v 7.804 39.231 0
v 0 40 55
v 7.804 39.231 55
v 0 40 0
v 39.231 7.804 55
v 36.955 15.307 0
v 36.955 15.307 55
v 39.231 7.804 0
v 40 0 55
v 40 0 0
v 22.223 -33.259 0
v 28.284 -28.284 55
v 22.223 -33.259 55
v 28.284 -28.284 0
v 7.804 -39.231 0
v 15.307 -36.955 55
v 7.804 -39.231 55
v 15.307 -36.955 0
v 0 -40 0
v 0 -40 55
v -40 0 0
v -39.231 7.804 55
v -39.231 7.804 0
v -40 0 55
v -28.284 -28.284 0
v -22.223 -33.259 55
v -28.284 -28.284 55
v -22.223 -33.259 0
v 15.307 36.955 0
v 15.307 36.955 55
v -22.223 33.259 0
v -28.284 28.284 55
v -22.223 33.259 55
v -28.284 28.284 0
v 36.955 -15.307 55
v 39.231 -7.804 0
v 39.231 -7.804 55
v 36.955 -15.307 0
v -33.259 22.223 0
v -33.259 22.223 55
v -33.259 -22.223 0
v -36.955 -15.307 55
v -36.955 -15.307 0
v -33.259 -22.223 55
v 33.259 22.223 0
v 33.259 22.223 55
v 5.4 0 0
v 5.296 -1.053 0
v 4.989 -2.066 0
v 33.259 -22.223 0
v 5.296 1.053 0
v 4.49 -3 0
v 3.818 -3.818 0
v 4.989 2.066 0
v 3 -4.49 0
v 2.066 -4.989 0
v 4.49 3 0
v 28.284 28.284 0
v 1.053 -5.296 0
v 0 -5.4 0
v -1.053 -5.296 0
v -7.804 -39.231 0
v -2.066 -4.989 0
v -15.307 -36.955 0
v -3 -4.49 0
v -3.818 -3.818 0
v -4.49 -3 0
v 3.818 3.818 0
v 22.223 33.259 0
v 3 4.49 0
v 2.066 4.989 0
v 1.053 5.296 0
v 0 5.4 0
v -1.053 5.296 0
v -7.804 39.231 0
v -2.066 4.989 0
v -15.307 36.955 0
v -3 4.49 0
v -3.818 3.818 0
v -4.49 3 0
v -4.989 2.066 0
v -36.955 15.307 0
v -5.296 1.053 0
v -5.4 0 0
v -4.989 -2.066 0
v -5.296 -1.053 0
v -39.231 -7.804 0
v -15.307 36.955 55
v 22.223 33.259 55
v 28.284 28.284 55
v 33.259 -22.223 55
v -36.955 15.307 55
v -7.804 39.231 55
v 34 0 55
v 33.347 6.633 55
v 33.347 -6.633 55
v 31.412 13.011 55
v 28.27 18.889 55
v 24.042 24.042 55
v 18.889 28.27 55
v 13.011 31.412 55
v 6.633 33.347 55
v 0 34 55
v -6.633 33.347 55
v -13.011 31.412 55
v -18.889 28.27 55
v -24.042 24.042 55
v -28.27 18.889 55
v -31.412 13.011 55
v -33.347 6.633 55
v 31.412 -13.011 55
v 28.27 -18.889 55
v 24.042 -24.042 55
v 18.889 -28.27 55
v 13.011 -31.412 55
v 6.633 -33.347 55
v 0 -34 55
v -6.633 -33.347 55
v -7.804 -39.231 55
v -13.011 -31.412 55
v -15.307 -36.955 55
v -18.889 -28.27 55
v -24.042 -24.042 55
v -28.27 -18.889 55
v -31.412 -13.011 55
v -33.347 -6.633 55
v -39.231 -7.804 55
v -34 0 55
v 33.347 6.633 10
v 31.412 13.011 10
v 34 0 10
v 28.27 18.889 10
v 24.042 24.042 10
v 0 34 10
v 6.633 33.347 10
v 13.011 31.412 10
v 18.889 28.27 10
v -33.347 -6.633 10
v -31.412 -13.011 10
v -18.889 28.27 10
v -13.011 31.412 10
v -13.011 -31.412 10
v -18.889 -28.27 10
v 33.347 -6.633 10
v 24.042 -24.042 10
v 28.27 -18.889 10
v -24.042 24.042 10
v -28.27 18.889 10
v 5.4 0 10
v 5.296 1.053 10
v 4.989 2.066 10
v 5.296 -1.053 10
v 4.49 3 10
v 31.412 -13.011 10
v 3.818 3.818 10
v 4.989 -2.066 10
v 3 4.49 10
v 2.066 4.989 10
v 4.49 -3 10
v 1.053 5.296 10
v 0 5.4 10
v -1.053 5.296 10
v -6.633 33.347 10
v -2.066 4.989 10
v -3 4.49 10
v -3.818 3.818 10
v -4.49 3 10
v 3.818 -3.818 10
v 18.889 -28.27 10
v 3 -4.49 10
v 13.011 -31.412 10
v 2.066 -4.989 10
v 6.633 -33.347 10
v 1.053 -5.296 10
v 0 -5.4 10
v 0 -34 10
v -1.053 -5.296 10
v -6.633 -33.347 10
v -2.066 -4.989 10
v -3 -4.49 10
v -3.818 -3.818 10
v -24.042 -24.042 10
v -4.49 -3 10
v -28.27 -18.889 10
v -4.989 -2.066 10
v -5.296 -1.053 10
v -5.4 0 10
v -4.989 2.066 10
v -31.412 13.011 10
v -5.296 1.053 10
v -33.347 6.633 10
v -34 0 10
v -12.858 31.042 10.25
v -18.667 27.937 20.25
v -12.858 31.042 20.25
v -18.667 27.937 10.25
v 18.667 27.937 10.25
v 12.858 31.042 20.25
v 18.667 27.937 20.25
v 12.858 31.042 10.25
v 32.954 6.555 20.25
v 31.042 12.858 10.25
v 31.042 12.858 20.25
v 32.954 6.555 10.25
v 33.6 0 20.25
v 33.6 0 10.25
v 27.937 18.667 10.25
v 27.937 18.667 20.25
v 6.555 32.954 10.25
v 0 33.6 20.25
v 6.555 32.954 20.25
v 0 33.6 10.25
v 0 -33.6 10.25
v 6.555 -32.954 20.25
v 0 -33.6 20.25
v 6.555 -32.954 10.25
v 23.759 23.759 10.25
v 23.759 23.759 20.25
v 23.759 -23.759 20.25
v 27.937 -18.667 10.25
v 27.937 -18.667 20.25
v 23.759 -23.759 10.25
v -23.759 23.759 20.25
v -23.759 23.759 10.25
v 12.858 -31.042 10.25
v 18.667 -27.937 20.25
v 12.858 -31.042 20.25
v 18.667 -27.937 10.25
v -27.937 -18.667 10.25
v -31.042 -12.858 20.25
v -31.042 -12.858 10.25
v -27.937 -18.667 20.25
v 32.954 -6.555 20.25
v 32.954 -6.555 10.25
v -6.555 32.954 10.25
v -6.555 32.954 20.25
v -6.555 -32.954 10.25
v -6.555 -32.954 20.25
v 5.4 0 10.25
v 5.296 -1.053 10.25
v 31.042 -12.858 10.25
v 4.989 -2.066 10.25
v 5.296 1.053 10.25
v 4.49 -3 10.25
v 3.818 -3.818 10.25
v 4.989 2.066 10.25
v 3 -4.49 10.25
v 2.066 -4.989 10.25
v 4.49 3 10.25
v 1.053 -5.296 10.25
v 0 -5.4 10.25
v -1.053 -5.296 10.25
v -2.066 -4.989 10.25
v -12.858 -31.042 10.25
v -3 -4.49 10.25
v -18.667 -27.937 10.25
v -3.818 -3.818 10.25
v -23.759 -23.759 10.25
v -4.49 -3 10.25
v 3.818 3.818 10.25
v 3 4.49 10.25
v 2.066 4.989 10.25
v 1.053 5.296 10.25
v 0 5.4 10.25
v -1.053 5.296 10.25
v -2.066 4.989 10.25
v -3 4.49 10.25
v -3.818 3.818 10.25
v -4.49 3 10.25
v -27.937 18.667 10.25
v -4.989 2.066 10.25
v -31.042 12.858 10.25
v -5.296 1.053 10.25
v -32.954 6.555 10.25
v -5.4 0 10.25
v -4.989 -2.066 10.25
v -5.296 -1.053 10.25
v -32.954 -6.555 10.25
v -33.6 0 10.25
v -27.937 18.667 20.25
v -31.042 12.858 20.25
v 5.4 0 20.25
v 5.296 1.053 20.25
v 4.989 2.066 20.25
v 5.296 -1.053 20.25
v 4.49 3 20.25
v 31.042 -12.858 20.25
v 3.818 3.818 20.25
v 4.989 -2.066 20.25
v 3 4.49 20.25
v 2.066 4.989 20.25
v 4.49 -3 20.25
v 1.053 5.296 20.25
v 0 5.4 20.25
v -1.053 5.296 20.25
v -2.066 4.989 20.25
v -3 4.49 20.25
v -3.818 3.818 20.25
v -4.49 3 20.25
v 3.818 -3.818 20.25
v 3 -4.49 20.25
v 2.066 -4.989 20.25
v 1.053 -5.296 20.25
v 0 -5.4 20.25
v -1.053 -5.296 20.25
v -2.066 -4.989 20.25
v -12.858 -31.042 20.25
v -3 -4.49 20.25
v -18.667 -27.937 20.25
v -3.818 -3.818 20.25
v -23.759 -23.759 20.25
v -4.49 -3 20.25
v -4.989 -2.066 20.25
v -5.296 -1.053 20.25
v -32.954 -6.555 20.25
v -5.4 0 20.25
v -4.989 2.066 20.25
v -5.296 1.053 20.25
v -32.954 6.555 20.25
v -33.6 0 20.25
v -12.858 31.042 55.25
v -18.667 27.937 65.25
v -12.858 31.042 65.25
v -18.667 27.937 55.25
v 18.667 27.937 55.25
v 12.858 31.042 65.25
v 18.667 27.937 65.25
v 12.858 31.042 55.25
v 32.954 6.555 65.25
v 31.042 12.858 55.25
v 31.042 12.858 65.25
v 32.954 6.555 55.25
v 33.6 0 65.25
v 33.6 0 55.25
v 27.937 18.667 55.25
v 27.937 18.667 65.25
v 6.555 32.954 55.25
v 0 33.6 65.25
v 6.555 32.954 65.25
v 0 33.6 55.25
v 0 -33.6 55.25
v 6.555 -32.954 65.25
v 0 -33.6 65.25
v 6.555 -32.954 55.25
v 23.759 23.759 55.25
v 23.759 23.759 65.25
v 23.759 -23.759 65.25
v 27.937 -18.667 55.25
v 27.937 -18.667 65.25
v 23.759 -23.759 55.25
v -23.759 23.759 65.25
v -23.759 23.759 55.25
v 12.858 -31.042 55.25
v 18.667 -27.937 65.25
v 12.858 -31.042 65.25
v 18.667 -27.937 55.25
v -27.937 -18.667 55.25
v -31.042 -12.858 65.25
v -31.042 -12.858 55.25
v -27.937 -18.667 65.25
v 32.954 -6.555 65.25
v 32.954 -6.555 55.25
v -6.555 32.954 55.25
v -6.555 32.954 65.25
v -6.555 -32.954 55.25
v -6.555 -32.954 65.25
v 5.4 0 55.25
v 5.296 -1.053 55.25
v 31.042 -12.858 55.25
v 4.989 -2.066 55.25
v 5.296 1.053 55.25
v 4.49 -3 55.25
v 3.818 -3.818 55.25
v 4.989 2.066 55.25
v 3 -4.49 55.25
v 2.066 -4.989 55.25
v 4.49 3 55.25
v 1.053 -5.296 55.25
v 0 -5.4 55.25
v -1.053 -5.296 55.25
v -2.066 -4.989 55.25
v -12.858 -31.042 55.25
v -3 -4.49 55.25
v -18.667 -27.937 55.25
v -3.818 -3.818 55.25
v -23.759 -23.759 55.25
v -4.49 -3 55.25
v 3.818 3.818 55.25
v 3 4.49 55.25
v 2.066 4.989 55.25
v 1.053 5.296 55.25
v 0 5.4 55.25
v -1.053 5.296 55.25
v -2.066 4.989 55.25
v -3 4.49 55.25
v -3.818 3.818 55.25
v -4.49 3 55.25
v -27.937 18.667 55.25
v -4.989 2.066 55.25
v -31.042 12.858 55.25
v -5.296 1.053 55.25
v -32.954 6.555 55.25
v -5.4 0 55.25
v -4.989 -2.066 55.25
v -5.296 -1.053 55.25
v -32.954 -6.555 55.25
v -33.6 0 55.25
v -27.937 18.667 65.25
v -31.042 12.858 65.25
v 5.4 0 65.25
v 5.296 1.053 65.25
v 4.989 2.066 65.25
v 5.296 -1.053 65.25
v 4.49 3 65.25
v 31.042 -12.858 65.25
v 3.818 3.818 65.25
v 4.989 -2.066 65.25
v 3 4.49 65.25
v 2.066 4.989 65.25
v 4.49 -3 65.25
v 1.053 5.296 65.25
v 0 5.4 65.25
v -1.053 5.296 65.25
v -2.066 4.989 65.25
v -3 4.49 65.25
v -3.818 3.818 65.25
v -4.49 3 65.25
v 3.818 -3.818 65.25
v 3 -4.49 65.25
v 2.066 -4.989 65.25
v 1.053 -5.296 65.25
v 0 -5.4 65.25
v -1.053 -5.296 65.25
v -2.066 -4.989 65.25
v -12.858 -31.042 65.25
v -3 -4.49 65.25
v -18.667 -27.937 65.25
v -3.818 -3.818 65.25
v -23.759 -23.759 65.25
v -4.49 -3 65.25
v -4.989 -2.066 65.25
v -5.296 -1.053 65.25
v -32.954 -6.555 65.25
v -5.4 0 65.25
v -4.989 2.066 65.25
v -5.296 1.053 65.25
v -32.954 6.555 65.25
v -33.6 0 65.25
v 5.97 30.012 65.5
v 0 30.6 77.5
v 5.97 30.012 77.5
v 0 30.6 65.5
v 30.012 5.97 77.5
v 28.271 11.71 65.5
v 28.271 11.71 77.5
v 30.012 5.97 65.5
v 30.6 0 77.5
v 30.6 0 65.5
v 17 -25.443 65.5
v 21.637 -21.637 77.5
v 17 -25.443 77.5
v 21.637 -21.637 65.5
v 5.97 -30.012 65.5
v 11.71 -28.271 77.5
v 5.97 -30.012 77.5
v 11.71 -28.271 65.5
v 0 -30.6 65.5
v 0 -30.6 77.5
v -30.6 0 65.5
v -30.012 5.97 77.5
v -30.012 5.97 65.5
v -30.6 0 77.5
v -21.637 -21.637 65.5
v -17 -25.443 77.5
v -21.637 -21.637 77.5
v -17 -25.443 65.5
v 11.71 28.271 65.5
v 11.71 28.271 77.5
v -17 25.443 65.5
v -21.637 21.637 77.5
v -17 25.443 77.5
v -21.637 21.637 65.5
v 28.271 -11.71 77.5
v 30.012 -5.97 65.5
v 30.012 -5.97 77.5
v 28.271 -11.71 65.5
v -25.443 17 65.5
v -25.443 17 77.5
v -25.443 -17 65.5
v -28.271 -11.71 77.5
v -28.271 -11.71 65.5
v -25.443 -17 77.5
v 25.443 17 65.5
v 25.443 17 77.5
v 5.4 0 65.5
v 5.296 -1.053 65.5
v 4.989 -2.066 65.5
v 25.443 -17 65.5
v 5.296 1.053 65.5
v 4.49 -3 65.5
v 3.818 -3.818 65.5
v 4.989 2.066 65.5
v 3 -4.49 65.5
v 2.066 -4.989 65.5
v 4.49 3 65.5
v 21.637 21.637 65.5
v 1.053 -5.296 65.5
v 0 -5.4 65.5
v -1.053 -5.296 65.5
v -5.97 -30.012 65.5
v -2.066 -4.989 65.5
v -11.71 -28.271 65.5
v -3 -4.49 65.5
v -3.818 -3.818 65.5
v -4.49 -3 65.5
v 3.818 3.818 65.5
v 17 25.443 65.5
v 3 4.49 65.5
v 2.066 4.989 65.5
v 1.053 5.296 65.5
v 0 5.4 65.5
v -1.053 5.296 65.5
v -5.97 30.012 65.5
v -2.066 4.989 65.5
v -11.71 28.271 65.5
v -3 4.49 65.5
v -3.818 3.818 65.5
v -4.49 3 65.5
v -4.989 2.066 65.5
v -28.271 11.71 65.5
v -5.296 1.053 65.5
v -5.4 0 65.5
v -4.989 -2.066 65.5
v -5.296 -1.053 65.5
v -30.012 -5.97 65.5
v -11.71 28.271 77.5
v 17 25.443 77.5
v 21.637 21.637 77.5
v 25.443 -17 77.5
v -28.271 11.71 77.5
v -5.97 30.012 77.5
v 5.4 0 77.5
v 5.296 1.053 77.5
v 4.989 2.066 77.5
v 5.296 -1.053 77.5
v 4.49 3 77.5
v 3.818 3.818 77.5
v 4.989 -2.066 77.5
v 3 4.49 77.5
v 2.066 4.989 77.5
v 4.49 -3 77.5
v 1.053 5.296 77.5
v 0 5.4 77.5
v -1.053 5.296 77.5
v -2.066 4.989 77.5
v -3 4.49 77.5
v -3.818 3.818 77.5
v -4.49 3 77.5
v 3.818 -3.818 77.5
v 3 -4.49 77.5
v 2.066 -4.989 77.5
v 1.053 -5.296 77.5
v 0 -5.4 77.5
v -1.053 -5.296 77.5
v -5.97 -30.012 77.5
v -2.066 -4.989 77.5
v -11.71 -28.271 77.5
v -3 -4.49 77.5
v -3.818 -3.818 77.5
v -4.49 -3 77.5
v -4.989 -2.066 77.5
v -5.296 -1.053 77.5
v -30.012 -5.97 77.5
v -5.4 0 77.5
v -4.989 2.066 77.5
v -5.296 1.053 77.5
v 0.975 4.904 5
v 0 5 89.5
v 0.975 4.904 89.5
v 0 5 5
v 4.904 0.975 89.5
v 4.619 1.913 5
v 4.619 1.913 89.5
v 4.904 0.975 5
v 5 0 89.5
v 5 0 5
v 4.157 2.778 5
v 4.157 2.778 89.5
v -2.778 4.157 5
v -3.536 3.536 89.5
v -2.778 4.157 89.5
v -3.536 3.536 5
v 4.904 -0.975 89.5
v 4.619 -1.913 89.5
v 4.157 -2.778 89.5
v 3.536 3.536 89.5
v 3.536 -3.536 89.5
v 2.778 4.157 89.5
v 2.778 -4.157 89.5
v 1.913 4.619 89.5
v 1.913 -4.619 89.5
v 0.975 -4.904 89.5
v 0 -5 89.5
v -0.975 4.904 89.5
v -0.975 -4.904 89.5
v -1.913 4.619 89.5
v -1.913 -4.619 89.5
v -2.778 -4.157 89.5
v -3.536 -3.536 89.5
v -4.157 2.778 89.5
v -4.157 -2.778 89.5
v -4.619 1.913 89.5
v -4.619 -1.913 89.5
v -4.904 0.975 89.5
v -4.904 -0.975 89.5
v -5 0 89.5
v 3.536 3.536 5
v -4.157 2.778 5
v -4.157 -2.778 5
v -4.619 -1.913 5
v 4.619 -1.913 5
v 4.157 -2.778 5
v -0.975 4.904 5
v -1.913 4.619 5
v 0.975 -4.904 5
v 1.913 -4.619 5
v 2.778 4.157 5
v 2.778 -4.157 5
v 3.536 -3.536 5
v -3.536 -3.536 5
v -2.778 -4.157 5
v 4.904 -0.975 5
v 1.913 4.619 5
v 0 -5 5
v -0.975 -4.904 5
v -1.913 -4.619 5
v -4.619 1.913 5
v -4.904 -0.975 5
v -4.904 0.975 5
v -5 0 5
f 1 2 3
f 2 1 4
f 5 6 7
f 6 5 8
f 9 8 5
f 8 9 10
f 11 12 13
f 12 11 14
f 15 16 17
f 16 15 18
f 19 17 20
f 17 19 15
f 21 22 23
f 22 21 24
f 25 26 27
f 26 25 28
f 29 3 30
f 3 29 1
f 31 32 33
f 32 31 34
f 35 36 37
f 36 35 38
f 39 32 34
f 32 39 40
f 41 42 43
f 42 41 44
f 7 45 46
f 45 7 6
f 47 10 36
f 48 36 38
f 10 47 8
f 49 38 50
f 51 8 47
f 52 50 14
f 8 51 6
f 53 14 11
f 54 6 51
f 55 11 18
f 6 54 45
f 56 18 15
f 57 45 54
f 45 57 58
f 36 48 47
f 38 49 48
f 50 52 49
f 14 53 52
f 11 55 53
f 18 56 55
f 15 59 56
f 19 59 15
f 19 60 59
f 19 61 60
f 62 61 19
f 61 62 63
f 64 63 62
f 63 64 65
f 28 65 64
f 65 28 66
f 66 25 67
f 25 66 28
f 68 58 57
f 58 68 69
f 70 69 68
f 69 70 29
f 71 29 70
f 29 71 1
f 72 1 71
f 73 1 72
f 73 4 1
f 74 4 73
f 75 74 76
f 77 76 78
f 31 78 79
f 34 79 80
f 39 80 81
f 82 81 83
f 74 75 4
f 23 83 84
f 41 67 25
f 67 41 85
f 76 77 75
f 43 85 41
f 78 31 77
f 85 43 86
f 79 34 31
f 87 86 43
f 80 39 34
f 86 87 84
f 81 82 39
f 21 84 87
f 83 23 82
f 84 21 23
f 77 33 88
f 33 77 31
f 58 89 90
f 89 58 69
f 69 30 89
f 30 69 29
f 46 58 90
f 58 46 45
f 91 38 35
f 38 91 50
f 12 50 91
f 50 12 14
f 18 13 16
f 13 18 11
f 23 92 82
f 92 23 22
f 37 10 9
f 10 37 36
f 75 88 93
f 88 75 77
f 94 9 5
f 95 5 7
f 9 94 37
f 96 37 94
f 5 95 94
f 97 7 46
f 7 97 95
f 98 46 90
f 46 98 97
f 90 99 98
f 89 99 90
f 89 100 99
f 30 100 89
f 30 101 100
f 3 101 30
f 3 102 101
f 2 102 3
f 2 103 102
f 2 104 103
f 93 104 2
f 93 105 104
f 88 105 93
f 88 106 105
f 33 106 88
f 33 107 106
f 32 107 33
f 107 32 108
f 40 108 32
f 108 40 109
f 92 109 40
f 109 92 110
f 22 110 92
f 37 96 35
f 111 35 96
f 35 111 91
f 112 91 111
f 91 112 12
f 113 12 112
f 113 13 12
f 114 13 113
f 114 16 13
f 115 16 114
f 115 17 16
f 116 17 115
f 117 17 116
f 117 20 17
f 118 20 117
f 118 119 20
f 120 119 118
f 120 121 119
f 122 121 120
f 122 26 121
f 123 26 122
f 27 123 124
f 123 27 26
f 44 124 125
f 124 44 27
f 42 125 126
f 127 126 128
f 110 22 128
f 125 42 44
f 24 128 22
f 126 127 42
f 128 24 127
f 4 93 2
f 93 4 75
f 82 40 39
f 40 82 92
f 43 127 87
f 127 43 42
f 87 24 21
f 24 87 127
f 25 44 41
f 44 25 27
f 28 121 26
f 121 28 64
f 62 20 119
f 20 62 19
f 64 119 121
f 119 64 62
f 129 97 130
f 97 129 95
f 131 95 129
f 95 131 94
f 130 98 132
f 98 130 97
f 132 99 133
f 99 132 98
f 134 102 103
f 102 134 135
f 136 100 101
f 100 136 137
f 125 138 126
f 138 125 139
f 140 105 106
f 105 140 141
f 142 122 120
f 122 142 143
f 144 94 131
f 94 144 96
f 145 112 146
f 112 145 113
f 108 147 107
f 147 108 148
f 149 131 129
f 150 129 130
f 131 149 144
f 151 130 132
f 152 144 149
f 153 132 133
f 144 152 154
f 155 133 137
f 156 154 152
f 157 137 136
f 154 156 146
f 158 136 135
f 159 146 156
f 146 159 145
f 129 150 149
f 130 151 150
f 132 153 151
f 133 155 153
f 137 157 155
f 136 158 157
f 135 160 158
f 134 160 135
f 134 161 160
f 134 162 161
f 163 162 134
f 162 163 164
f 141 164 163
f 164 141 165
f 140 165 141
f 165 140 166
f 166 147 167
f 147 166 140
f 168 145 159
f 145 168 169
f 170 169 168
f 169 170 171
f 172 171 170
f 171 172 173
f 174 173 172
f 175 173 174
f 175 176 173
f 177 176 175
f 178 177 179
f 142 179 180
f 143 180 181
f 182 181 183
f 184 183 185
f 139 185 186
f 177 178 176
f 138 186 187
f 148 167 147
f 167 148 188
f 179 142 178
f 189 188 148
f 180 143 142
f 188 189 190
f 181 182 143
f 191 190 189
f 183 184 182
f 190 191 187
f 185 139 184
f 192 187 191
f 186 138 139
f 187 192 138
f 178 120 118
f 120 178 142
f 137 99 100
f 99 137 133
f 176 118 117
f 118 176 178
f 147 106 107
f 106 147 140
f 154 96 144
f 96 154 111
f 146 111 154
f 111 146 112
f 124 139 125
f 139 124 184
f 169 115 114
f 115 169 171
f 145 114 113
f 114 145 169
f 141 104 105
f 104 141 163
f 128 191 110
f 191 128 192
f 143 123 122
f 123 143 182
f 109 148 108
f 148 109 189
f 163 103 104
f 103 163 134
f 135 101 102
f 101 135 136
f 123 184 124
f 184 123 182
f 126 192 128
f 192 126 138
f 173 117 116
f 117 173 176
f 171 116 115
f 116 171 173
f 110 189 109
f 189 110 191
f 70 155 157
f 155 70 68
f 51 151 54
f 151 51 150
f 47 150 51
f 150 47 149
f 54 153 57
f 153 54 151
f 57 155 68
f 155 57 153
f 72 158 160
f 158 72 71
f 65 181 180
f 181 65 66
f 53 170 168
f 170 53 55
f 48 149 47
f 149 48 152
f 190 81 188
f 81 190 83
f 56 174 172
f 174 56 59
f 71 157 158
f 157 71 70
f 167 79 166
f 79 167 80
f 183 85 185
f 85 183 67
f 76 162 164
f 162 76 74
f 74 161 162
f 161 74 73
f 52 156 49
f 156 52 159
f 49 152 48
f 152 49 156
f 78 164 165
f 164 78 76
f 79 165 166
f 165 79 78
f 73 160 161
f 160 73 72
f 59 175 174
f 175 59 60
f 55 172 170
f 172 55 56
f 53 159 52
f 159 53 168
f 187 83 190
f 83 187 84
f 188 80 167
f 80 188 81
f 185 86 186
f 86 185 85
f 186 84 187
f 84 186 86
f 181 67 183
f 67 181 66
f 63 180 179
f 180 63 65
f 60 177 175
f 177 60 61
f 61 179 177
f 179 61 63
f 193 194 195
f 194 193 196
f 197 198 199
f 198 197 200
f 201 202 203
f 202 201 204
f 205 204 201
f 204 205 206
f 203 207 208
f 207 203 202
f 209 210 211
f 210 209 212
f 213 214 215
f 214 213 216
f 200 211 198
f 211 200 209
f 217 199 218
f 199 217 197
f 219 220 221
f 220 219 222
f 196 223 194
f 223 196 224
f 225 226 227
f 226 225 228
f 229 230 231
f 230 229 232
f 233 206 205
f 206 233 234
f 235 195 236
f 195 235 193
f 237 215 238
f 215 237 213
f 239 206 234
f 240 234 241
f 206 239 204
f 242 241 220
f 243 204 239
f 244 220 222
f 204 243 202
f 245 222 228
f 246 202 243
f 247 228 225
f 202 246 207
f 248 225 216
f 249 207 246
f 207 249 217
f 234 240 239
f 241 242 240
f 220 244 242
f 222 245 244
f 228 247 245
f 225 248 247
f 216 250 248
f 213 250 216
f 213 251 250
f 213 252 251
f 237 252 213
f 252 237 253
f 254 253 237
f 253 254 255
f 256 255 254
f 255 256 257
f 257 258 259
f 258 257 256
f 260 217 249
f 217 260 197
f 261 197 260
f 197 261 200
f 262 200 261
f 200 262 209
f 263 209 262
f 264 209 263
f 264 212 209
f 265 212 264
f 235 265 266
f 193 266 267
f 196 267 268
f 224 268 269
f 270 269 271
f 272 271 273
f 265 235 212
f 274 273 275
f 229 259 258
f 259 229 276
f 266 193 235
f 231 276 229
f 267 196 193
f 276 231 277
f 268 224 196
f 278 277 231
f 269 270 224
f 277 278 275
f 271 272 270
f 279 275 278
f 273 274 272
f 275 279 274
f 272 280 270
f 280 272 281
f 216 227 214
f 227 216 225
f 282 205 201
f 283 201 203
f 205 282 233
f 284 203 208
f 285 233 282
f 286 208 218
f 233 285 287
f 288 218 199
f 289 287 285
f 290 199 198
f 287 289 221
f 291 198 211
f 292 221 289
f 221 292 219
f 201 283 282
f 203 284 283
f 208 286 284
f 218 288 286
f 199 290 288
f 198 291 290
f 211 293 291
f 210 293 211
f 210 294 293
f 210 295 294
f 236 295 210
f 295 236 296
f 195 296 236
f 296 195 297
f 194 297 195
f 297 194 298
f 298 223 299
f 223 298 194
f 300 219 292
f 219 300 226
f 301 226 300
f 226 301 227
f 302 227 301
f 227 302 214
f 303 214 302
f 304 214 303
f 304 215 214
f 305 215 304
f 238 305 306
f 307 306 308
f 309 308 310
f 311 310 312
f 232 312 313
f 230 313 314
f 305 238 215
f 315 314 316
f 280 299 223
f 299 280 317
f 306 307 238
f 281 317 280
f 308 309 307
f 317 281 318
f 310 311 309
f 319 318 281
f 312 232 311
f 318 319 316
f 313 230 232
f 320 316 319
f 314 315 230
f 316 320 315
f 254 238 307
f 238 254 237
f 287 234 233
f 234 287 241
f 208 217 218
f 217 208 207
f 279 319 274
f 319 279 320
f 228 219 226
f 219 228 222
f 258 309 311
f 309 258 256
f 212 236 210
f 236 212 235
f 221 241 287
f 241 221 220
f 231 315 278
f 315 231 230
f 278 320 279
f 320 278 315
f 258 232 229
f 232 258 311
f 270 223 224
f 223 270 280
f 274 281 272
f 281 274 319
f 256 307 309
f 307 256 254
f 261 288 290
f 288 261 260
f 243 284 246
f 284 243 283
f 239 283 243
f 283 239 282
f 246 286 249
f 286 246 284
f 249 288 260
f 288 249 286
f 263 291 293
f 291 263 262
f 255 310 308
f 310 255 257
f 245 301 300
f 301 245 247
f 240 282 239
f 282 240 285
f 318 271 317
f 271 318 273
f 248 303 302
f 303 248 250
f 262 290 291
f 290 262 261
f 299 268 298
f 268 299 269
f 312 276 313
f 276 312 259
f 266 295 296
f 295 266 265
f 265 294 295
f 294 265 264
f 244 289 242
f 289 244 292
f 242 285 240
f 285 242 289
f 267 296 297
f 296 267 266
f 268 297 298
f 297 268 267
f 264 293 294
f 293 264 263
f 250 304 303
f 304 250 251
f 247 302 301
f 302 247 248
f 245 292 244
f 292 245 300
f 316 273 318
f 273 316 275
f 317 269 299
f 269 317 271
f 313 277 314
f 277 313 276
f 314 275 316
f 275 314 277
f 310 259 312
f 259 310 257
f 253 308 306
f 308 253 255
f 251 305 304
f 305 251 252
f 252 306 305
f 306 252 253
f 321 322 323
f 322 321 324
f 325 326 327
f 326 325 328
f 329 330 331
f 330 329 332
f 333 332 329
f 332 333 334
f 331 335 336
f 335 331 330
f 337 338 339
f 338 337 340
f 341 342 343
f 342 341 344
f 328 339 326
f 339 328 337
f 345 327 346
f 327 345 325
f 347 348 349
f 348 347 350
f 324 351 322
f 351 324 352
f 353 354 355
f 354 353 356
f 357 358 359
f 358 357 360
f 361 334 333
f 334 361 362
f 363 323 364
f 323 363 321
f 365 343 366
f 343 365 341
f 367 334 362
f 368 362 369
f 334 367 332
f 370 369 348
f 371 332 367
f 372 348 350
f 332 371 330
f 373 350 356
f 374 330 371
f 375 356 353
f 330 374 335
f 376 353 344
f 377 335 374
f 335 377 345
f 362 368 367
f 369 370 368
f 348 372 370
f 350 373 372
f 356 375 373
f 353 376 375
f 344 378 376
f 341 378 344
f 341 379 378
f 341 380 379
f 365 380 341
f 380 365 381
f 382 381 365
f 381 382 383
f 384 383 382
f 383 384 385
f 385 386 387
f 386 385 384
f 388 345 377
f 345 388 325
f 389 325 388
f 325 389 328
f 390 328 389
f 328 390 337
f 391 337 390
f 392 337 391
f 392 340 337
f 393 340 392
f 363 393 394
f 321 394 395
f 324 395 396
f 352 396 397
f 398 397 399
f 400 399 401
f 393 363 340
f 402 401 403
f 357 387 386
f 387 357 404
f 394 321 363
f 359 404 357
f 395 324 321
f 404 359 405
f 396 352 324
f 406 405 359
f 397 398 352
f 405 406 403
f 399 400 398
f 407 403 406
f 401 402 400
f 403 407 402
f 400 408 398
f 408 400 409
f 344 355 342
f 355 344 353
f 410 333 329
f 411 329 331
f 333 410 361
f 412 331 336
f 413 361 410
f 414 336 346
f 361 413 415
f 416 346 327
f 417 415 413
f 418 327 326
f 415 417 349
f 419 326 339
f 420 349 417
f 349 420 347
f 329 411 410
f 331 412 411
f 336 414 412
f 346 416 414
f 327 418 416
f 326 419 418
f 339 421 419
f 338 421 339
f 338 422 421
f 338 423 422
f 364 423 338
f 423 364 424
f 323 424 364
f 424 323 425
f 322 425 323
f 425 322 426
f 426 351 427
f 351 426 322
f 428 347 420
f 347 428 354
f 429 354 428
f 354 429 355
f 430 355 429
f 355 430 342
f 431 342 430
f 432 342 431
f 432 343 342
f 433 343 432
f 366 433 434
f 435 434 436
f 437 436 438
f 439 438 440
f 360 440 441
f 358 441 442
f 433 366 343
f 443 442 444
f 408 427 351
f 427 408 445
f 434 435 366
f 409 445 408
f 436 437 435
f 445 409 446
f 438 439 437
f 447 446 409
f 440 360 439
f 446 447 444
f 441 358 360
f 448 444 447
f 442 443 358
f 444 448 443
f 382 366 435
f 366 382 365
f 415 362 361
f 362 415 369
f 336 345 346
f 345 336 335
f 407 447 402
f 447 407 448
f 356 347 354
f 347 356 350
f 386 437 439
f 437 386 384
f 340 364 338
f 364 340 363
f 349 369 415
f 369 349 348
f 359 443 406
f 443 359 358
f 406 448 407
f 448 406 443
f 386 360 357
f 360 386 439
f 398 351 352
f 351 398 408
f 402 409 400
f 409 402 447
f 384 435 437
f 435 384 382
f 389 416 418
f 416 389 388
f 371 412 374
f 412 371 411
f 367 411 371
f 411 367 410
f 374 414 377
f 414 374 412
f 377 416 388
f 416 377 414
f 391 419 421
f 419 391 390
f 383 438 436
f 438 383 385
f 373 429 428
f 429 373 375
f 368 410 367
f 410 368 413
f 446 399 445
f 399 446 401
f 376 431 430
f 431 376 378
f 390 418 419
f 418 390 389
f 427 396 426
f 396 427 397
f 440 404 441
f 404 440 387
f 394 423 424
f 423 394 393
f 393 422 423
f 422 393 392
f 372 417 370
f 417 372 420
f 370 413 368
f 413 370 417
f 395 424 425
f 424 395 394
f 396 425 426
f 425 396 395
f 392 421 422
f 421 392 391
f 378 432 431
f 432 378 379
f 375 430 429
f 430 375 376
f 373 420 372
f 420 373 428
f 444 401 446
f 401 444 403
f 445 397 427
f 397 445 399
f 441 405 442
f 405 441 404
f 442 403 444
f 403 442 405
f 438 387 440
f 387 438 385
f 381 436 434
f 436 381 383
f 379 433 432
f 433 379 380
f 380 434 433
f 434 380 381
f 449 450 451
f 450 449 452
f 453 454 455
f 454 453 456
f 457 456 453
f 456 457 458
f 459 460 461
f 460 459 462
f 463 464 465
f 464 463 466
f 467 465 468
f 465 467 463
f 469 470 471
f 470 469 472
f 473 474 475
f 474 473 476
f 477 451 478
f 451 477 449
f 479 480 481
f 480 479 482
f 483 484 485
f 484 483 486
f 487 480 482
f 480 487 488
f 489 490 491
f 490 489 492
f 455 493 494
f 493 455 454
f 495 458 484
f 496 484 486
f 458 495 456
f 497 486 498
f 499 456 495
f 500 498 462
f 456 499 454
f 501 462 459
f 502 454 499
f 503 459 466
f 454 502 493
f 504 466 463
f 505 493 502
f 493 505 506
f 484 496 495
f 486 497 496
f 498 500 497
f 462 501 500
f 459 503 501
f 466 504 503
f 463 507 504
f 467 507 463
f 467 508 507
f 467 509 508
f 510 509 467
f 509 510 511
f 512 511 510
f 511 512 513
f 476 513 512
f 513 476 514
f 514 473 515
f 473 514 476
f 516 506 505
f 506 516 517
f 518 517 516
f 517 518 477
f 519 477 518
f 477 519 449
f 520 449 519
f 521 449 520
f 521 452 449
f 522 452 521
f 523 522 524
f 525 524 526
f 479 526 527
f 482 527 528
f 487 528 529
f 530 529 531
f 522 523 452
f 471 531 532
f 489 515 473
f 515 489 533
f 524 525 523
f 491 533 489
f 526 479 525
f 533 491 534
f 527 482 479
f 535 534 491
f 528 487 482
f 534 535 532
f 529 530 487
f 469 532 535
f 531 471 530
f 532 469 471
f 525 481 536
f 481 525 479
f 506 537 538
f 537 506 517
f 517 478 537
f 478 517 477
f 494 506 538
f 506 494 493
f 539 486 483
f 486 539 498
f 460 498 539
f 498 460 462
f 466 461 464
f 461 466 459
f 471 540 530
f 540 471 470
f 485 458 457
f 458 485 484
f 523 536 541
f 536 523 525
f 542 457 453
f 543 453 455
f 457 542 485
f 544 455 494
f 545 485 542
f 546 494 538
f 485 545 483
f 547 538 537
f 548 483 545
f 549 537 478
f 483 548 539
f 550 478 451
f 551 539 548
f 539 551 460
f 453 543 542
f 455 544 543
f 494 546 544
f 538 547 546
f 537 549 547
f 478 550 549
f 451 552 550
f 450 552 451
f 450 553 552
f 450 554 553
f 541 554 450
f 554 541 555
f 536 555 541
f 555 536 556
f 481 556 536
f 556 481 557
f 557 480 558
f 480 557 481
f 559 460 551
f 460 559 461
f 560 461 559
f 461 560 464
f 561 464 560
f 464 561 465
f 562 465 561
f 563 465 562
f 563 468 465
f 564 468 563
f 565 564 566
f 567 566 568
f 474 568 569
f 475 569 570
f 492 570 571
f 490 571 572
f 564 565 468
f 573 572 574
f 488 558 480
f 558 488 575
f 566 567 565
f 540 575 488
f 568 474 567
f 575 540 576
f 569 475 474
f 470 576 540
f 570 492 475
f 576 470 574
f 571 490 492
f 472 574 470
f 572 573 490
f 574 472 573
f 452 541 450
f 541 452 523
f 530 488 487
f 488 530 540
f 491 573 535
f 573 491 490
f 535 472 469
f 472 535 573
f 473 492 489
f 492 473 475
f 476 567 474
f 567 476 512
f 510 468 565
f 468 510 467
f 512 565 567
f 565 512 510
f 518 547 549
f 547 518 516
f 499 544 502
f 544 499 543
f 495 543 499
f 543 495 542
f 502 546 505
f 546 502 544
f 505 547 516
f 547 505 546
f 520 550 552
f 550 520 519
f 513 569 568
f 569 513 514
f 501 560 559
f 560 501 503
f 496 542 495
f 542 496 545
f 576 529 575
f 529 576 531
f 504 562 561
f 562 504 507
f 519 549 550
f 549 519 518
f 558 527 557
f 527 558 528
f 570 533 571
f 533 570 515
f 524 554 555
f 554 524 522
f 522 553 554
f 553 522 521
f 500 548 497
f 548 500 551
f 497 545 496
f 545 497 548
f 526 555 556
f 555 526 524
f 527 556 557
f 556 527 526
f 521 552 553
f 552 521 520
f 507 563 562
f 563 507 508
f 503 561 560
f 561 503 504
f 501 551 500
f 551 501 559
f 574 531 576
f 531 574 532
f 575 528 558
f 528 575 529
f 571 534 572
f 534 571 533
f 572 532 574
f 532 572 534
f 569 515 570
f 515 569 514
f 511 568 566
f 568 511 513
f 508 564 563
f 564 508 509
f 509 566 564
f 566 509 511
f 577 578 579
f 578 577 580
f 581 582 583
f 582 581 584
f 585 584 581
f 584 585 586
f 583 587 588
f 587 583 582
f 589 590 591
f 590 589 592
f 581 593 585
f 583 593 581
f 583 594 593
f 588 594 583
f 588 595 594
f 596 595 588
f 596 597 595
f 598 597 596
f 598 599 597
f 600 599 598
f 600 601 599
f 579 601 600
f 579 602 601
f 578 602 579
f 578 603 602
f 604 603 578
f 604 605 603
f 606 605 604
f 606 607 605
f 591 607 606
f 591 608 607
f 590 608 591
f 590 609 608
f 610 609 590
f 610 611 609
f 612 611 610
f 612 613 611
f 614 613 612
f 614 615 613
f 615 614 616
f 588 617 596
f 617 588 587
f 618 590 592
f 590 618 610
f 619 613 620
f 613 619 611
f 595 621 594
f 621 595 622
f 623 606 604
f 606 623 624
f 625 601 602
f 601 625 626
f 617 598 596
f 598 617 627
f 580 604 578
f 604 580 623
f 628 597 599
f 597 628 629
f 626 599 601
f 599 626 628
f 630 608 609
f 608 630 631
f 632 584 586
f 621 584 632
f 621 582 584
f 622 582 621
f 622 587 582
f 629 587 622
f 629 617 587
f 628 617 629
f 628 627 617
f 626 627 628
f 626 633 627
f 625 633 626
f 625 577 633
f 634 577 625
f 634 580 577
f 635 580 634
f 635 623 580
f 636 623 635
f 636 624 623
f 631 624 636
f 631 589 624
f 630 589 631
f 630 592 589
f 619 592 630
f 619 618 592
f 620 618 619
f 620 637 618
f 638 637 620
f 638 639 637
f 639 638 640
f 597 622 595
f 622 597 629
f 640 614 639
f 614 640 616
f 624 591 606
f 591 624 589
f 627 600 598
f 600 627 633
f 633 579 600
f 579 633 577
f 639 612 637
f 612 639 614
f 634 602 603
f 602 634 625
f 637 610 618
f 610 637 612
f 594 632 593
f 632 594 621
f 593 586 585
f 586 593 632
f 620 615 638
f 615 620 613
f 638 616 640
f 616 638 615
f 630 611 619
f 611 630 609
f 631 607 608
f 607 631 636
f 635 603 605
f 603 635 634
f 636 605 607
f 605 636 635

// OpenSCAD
$fn = 32;

// ------------------------------------------------------------------------
// Bearing housing: housing d80, two bearings and a shaft
// Every part is its own module, assembly() places them once.
// ------------------------------------------------------------------------

// --- part 1 ---
module housing() {
  difference() {
    cylinder(h = 55, d = 80);
    translate([0, 0, 10]) cylinder(h = 46, d = 68);
    translate([0, 0, -1]) cylinder(h = 12, d = 10.8);
  }
}

// --- part 2 ---
module bearing_lower() {
  difference() {
      translate([0, 0, 0]) cylinder(h = 10, d = 67.2);
      translate([0, 0, -1]) cylinder(h = 12, d = 10.8);
    }
}

// --- part 3 ---
module bearing_upper() {
  difference() {
      translate([0, 0, 0]) cylinder(h = 10, d = 67.2);
      translate([0, 0, -1]) cylinder(h = 12, d = 10.8);
    }
}

// --- part 4 ---
module spacer() {
  difference() {
      translate([0, 0, 0]) cylinder(h = 12, d = 61.2);
      translate([0, 0, -1]) cylinder(h = 14, d = 10.8);
    }
}

// --- part 5 ---
module shaft() {
  translate([0, 0, -42.25]) cylinder(h = 84.5, d = 10);
}

// --- assembly ---
module assembly() {
  translate([0, 0, 0]) rotate([0, 0, 0]) housing();
  translate([0, 0, 10.25]) rotate([0, 0, 0]) bearing_lower();
  translate([0, 0, 55.25]) rotate([0, 0, 0]) bearing_upper();
  translate([0, 0, 65.5]) rotate([0, 0, 0]) spacer();
  translate([0, 0, 47.25]) rotate([0, 0, 0]) shaft();
}

assembly();
